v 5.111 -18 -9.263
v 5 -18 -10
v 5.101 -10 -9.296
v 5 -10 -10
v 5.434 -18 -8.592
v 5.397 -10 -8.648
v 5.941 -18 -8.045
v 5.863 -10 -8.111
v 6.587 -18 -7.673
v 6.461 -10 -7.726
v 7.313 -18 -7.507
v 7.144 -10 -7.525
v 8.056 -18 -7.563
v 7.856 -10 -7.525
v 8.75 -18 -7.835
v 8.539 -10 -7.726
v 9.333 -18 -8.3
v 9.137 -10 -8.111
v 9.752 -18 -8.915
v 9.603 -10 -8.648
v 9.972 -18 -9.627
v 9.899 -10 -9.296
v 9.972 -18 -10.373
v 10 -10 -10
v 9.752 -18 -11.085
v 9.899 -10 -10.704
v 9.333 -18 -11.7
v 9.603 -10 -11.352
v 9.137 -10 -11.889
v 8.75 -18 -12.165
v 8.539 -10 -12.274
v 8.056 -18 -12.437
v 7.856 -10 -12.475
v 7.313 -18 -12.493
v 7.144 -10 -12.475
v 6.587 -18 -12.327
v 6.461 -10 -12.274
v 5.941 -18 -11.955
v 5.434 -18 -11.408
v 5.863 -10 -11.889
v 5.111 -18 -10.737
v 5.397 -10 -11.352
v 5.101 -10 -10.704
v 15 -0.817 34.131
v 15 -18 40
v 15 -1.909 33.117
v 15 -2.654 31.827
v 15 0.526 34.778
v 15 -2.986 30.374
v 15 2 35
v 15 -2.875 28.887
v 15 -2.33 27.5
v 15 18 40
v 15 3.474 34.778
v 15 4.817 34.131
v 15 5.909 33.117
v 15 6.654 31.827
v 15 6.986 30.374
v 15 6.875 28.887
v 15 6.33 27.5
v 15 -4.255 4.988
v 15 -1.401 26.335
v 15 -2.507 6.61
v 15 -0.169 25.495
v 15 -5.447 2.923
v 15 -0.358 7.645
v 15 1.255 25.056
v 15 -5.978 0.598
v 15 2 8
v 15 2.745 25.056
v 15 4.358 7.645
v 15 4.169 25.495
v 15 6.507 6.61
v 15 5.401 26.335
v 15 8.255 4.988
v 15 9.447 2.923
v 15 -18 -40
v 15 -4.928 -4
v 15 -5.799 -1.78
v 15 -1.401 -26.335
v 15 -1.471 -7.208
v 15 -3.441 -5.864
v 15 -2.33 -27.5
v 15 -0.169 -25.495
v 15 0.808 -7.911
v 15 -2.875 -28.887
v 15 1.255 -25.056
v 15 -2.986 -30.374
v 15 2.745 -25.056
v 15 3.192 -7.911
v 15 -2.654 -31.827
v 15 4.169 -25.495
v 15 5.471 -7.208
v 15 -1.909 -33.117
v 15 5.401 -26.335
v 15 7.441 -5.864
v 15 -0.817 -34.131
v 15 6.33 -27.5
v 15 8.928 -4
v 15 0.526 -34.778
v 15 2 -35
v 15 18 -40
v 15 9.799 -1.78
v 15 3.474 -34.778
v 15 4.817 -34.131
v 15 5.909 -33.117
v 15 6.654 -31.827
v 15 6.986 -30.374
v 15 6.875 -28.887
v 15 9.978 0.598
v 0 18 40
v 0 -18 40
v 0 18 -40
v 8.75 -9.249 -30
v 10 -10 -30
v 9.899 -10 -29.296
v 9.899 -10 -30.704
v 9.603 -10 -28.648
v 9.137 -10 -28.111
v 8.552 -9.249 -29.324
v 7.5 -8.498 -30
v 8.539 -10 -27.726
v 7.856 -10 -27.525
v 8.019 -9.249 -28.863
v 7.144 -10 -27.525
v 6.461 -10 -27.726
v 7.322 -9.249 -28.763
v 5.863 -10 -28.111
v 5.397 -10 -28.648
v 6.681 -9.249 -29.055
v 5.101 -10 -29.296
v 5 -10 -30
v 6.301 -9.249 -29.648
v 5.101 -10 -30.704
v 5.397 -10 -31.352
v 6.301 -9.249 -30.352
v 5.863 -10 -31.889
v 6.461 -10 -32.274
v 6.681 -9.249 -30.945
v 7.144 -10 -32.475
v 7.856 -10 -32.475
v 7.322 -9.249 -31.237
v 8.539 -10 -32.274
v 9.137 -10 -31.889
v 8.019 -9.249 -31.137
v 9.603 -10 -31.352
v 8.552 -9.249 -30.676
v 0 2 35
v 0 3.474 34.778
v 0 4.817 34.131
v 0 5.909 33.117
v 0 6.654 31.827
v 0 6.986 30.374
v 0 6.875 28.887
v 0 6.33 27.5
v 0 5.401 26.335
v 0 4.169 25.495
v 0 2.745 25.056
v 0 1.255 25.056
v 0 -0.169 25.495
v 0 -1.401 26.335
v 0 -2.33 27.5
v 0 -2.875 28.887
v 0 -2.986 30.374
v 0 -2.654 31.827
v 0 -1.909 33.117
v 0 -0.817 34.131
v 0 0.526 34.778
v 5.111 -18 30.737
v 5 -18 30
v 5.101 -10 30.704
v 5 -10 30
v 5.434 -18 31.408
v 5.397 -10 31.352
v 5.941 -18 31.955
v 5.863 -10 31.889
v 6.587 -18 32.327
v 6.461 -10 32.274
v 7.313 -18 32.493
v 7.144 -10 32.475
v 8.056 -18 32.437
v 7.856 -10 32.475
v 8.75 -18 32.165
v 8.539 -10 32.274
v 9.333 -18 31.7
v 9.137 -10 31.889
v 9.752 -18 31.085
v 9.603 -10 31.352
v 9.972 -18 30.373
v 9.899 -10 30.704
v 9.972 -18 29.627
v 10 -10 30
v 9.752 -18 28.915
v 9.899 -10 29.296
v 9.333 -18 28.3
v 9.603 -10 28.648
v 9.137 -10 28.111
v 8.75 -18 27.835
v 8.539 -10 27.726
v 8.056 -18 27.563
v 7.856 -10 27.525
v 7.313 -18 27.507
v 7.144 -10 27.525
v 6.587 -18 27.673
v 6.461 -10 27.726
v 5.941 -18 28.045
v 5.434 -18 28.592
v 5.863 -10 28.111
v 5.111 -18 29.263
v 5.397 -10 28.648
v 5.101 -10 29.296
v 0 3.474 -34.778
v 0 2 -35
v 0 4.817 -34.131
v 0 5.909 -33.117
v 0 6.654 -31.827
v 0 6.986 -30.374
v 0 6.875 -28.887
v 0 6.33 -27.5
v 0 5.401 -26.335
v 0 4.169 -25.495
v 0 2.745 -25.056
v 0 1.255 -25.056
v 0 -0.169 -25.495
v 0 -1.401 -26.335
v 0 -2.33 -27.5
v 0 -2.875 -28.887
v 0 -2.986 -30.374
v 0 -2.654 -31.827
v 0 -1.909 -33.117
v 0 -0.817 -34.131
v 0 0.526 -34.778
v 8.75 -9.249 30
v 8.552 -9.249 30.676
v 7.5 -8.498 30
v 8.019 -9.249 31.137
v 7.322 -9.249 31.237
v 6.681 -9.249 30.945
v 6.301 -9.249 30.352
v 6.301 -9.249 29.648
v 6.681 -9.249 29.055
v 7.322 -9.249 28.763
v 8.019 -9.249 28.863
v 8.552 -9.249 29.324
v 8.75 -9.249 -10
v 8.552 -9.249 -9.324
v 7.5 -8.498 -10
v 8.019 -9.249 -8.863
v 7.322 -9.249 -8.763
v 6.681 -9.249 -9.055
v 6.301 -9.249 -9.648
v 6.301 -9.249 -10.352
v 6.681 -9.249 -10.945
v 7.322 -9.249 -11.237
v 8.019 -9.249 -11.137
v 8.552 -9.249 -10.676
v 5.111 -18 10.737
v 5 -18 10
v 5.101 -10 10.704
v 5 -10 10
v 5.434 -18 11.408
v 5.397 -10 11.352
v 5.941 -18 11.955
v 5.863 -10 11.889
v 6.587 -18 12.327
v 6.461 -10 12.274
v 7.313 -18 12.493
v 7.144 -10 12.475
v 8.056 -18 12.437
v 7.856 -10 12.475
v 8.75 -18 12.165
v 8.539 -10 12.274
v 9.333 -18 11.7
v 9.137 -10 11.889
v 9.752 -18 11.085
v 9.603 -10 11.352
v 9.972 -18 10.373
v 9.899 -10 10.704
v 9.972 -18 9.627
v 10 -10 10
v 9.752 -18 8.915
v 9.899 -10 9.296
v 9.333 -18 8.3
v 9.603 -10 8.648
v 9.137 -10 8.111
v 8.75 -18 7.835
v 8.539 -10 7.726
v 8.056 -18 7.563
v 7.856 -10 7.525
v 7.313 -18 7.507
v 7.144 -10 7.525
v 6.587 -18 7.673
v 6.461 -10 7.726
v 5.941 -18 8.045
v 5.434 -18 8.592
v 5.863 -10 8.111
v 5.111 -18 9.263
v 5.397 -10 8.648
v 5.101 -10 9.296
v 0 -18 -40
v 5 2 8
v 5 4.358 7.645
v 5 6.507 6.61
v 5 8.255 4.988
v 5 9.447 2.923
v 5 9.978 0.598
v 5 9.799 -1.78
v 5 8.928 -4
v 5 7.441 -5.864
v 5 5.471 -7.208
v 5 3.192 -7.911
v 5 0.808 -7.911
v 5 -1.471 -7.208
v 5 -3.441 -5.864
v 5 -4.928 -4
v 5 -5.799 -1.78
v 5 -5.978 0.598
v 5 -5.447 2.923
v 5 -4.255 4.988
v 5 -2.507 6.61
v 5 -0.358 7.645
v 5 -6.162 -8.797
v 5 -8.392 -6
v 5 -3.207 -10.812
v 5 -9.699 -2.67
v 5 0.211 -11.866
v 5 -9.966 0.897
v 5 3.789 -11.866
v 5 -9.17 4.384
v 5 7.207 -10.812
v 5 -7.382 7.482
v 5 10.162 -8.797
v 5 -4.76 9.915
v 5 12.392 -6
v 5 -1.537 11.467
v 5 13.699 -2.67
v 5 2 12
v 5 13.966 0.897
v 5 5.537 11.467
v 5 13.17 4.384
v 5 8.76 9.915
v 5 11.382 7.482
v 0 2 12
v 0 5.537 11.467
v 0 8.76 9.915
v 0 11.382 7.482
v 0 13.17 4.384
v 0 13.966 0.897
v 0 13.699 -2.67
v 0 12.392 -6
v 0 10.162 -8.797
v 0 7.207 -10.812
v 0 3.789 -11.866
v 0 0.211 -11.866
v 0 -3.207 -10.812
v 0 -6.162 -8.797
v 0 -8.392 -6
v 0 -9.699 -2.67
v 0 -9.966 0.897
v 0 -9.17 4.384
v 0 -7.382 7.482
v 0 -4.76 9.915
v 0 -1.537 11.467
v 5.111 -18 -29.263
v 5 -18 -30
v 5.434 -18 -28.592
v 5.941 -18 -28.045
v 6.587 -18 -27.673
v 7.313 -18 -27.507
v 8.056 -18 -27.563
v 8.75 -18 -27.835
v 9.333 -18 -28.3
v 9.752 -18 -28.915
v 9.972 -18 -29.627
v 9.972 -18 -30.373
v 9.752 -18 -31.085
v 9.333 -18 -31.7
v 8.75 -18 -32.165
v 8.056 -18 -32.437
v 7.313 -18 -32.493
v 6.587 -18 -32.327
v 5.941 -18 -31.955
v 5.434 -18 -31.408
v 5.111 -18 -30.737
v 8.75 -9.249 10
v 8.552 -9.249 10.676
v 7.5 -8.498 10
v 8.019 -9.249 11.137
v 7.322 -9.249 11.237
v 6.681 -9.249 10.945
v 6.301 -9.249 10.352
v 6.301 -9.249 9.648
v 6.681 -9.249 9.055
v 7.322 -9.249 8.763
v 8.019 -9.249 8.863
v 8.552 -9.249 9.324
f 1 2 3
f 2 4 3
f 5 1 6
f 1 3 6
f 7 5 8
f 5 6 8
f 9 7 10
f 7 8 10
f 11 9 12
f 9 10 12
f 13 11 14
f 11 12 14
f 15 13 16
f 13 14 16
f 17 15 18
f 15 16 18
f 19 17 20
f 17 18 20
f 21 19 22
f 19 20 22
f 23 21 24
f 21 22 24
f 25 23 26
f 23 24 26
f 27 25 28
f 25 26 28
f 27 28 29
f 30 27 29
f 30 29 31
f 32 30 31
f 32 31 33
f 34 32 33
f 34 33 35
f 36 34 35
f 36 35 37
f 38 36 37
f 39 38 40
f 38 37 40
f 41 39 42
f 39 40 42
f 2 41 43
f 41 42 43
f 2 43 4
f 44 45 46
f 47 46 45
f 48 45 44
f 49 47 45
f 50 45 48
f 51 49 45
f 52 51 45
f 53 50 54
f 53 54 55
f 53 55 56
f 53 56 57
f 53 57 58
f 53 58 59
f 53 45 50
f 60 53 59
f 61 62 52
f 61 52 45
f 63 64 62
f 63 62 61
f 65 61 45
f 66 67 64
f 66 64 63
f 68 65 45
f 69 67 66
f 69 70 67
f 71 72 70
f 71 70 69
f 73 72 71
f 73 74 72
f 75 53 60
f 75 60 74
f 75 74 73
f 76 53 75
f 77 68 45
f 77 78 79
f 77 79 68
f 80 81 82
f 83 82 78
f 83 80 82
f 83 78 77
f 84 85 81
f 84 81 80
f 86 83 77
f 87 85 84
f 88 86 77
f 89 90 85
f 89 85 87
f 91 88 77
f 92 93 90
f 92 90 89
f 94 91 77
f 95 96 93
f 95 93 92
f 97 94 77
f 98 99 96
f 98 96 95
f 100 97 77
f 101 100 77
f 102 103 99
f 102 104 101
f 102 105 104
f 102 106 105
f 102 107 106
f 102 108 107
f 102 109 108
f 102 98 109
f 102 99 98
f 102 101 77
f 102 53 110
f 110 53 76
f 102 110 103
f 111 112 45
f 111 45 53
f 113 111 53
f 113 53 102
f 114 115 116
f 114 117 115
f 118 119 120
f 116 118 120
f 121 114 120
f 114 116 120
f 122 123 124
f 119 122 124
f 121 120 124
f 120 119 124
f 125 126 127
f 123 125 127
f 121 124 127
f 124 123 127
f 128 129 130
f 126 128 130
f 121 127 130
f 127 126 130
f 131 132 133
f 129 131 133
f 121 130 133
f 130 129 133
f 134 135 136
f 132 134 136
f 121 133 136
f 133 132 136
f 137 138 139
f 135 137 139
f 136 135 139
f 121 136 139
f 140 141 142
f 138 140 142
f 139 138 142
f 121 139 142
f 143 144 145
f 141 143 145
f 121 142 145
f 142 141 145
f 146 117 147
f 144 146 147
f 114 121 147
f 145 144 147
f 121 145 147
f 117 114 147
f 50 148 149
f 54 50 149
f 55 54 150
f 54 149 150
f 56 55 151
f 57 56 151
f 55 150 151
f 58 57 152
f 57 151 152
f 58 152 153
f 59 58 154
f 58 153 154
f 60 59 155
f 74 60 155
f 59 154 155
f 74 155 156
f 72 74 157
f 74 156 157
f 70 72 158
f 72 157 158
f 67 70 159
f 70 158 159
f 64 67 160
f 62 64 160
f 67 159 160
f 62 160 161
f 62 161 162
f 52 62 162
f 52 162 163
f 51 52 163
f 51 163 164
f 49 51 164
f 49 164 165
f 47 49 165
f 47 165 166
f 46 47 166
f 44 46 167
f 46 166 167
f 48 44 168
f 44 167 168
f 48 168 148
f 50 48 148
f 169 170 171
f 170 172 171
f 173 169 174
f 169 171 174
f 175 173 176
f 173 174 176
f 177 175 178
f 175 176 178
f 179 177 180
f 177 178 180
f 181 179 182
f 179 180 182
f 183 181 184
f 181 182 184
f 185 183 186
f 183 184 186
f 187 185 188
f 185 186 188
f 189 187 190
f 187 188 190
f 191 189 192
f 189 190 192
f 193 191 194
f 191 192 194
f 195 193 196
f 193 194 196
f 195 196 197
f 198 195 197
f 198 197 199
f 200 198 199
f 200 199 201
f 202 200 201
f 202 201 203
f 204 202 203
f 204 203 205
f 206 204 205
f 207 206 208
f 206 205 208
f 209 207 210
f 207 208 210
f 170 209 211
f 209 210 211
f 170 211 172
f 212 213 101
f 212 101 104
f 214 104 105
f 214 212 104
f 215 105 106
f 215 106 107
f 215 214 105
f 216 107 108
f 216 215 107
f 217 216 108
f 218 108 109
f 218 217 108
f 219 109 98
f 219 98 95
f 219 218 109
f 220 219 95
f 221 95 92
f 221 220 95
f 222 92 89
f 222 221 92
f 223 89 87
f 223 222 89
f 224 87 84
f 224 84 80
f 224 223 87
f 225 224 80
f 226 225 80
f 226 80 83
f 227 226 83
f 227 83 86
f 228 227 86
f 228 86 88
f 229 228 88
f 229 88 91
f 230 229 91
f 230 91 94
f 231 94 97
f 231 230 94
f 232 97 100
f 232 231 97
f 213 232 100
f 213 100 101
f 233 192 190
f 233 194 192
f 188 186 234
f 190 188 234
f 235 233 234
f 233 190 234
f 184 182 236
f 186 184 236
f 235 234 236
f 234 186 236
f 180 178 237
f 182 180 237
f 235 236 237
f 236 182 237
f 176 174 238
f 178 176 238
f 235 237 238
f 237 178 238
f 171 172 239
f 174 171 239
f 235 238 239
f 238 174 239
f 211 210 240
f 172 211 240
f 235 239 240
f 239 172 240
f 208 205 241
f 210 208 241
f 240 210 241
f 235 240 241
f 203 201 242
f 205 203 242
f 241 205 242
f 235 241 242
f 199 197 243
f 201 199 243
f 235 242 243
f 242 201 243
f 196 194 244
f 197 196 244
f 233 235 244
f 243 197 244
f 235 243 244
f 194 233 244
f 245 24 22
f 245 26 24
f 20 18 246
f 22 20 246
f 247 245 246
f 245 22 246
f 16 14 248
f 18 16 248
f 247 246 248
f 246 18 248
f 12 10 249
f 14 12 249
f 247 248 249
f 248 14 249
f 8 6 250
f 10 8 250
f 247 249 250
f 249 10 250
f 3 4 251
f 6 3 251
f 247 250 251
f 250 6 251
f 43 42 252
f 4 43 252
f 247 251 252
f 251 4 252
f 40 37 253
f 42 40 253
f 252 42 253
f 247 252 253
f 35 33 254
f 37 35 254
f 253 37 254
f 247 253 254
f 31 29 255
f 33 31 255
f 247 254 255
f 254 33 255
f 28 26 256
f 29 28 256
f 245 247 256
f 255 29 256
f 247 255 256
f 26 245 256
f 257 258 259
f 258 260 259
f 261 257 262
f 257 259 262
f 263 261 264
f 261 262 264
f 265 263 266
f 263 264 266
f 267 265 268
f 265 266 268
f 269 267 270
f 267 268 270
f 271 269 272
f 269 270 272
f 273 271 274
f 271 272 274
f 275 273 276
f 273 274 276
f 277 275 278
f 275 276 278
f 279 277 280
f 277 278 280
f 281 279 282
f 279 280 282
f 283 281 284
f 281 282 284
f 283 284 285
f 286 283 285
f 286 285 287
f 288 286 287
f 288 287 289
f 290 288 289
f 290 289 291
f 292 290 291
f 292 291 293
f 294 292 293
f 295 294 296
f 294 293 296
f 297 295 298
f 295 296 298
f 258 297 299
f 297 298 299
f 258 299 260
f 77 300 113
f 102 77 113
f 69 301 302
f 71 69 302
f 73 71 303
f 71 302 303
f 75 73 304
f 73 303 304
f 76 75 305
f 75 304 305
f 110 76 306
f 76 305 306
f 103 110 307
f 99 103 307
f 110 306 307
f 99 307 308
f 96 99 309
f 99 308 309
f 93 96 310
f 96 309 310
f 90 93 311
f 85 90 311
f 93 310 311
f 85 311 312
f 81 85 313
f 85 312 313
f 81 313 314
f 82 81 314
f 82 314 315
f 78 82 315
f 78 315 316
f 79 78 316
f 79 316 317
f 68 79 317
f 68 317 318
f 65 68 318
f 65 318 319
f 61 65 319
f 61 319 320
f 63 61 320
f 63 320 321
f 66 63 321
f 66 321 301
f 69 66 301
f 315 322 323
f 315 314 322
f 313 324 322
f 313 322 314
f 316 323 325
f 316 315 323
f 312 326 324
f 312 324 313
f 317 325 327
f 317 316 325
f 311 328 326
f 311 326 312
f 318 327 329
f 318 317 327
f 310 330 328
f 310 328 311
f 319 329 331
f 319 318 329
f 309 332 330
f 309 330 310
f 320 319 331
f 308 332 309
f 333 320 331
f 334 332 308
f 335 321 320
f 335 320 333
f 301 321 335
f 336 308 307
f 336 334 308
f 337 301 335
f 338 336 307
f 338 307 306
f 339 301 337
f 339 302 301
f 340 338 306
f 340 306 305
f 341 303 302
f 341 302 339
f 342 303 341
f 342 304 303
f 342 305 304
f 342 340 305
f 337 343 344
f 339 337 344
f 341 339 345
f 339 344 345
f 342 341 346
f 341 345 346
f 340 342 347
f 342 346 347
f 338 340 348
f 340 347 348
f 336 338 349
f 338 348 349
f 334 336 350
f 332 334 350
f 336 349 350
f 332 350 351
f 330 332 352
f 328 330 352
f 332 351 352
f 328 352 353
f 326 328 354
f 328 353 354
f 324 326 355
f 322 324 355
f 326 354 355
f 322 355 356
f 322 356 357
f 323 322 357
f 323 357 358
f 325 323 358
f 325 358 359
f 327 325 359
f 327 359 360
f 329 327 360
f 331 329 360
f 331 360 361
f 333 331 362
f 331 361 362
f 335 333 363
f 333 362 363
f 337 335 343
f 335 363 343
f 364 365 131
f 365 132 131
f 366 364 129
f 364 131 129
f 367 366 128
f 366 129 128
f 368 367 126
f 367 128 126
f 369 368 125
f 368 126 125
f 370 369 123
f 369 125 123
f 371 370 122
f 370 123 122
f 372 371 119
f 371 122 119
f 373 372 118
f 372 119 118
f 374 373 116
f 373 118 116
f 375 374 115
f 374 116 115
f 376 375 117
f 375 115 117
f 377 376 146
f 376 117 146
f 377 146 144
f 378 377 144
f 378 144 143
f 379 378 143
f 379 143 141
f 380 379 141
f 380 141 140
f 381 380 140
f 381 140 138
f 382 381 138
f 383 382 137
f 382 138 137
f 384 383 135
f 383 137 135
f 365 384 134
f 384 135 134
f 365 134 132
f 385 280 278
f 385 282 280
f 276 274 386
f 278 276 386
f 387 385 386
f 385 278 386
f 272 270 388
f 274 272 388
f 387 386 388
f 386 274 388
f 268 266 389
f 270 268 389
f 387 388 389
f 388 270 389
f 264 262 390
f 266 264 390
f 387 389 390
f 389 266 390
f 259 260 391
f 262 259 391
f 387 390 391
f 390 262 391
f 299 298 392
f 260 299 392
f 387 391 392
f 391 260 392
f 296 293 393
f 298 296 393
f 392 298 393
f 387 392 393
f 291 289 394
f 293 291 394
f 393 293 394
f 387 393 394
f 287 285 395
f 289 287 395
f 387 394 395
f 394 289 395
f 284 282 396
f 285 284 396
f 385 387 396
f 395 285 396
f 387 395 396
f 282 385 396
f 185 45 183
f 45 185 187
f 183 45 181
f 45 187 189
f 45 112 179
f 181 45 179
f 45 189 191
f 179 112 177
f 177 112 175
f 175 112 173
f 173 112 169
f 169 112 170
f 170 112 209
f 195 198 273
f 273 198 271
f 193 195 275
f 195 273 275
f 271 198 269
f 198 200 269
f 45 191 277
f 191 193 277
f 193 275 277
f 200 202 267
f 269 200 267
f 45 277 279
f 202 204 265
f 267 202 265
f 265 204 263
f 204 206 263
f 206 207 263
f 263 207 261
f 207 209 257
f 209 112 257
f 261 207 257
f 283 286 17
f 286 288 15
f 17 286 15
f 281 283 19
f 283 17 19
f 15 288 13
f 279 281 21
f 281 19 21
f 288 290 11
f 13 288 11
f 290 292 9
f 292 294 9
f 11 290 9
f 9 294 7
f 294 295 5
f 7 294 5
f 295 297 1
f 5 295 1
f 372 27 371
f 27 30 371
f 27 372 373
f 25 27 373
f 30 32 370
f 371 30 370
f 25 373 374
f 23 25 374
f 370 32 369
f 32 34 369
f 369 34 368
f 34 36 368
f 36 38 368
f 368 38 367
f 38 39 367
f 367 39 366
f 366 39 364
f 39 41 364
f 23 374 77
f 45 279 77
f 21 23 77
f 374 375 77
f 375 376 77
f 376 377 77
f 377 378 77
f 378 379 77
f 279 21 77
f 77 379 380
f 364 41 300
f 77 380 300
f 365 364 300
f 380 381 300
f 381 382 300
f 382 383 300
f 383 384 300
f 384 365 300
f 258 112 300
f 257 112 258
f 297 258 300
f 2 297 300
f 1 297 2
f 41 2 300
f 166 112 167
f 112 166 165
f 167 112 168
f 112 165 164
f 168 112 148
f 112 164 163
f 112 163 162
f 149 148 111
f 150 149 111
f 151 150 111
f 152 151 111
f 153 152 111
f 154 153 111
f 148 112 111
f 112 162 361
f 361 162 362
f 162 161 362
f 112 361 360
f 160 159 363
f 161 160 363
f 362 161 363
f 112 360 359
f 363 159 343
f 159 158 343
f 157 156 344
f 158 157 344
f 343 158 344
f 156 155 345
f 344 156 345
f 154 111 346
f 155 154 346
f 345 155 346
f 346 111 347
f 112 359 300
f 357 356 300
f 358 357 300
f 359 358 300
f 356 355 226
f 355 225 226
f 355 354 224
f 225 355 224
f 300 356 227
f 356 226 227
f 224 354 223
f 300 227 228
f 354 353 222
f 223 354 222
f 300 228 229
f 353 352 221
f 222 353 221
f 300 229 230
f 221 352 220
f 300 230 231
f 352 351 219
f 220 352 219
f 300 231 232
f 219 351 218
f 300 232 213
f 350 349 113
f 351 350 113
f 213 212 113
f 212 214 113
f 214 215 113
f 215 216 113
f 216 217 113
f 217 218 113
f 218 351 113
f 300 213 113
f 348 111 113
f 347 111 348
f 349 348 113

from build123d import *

# Parameters (mm, degrees)
SKETCH_1_W             = 80
SKETCH_1_H             = 36
EXTRUDE_1_DEPTH        = 15
HOLE_WIZARD_M6_1_D     = 5
HOLE_WIZARD_M6_1_DEPTH = 8
HOLE_WIZARD_M6_1_TIP   = 1.502151548
SKETCH_4_R             = 12
CUT_EXTRUDE_1_DEPTH    = 5
SKETCH_5_R             = 5
CUT_EXTRUDE_2_DEPTH    = 15
SKETCH_6_R             = 8
CUT_EXTRUDE_3_DEPTH    = 45.988887517


with BuildPart() as part:
    # 草图1 → 凸台-拉伸1 (new body)
    with BuildSketch(Plane(origin=(0, 0, 0), x_dir=(0, 0, -1), z_dir=(1, 0, 0))):
        Rectangle(SKETCH_1_W, SKETCH_1_H)
    extrude(amount=EXTRUDE_1_DEPTH)

    # M6 螺纹孔1
    with Locations(Plane.XZ.offset(18)):
        with Locations((7.5, 30), (7.5, 10), (7.5, -10), (7.5, -30)):
            Hole(HOLE_WIZARD_M6_1_D / 2, depth=HOLE_WIZARD_M6_1_DEPTH)
            with Locations((0, 0, -(HOLE_WIZARD_M6_1_DEPTH + HOLE_WIZARD_M6_1_TIP / 2))):  # 118° drill point
                Cone(0, HOLE_WIZARD_M6_1_D / 2, HOLE_WIZARD_M6_1_TIP, mode=Mode.SUBTRACT)

    # 草图4 → 切除-拉伸1 (cut)
    with BuildSketch(Plane.ZY):
        with Locations((0, 2)):
            Circle(SKETCH_4_R)
    extrude(amount=-CUT_EXTRUDE_1_DEPTH, mode=Mode.SUBTRACT)

    # 草图5 → 切除-拉伸2 (cut)
    with BuildSketch(Plane.ZY):
        with Locations((30, 2)):
            Circle(SKETCH_5_R)
    cut_extrude_2 = extrude(amount=-CUT_EXTRUDE_2_DEPTH, mode=Mode.SUBTRACT)

    # 镜向1: 切除-拉伸2 across plane
    add(cut_extrude_2.mirror(Plane.XY), mode=Mode.SUBTRACT)

    # 草图6 → 切除-拉伸3 (cut, through all)
    with BuildSketch(Plane.ZY.offset(-5)):
        with Locations((0, 2)):
            Circle(SKETCH_6_R)
    extrude(amount=-CUT_EXTRUDE_3_DEPTH, mode=Mode.SUBTRACT)


solid = part.part
